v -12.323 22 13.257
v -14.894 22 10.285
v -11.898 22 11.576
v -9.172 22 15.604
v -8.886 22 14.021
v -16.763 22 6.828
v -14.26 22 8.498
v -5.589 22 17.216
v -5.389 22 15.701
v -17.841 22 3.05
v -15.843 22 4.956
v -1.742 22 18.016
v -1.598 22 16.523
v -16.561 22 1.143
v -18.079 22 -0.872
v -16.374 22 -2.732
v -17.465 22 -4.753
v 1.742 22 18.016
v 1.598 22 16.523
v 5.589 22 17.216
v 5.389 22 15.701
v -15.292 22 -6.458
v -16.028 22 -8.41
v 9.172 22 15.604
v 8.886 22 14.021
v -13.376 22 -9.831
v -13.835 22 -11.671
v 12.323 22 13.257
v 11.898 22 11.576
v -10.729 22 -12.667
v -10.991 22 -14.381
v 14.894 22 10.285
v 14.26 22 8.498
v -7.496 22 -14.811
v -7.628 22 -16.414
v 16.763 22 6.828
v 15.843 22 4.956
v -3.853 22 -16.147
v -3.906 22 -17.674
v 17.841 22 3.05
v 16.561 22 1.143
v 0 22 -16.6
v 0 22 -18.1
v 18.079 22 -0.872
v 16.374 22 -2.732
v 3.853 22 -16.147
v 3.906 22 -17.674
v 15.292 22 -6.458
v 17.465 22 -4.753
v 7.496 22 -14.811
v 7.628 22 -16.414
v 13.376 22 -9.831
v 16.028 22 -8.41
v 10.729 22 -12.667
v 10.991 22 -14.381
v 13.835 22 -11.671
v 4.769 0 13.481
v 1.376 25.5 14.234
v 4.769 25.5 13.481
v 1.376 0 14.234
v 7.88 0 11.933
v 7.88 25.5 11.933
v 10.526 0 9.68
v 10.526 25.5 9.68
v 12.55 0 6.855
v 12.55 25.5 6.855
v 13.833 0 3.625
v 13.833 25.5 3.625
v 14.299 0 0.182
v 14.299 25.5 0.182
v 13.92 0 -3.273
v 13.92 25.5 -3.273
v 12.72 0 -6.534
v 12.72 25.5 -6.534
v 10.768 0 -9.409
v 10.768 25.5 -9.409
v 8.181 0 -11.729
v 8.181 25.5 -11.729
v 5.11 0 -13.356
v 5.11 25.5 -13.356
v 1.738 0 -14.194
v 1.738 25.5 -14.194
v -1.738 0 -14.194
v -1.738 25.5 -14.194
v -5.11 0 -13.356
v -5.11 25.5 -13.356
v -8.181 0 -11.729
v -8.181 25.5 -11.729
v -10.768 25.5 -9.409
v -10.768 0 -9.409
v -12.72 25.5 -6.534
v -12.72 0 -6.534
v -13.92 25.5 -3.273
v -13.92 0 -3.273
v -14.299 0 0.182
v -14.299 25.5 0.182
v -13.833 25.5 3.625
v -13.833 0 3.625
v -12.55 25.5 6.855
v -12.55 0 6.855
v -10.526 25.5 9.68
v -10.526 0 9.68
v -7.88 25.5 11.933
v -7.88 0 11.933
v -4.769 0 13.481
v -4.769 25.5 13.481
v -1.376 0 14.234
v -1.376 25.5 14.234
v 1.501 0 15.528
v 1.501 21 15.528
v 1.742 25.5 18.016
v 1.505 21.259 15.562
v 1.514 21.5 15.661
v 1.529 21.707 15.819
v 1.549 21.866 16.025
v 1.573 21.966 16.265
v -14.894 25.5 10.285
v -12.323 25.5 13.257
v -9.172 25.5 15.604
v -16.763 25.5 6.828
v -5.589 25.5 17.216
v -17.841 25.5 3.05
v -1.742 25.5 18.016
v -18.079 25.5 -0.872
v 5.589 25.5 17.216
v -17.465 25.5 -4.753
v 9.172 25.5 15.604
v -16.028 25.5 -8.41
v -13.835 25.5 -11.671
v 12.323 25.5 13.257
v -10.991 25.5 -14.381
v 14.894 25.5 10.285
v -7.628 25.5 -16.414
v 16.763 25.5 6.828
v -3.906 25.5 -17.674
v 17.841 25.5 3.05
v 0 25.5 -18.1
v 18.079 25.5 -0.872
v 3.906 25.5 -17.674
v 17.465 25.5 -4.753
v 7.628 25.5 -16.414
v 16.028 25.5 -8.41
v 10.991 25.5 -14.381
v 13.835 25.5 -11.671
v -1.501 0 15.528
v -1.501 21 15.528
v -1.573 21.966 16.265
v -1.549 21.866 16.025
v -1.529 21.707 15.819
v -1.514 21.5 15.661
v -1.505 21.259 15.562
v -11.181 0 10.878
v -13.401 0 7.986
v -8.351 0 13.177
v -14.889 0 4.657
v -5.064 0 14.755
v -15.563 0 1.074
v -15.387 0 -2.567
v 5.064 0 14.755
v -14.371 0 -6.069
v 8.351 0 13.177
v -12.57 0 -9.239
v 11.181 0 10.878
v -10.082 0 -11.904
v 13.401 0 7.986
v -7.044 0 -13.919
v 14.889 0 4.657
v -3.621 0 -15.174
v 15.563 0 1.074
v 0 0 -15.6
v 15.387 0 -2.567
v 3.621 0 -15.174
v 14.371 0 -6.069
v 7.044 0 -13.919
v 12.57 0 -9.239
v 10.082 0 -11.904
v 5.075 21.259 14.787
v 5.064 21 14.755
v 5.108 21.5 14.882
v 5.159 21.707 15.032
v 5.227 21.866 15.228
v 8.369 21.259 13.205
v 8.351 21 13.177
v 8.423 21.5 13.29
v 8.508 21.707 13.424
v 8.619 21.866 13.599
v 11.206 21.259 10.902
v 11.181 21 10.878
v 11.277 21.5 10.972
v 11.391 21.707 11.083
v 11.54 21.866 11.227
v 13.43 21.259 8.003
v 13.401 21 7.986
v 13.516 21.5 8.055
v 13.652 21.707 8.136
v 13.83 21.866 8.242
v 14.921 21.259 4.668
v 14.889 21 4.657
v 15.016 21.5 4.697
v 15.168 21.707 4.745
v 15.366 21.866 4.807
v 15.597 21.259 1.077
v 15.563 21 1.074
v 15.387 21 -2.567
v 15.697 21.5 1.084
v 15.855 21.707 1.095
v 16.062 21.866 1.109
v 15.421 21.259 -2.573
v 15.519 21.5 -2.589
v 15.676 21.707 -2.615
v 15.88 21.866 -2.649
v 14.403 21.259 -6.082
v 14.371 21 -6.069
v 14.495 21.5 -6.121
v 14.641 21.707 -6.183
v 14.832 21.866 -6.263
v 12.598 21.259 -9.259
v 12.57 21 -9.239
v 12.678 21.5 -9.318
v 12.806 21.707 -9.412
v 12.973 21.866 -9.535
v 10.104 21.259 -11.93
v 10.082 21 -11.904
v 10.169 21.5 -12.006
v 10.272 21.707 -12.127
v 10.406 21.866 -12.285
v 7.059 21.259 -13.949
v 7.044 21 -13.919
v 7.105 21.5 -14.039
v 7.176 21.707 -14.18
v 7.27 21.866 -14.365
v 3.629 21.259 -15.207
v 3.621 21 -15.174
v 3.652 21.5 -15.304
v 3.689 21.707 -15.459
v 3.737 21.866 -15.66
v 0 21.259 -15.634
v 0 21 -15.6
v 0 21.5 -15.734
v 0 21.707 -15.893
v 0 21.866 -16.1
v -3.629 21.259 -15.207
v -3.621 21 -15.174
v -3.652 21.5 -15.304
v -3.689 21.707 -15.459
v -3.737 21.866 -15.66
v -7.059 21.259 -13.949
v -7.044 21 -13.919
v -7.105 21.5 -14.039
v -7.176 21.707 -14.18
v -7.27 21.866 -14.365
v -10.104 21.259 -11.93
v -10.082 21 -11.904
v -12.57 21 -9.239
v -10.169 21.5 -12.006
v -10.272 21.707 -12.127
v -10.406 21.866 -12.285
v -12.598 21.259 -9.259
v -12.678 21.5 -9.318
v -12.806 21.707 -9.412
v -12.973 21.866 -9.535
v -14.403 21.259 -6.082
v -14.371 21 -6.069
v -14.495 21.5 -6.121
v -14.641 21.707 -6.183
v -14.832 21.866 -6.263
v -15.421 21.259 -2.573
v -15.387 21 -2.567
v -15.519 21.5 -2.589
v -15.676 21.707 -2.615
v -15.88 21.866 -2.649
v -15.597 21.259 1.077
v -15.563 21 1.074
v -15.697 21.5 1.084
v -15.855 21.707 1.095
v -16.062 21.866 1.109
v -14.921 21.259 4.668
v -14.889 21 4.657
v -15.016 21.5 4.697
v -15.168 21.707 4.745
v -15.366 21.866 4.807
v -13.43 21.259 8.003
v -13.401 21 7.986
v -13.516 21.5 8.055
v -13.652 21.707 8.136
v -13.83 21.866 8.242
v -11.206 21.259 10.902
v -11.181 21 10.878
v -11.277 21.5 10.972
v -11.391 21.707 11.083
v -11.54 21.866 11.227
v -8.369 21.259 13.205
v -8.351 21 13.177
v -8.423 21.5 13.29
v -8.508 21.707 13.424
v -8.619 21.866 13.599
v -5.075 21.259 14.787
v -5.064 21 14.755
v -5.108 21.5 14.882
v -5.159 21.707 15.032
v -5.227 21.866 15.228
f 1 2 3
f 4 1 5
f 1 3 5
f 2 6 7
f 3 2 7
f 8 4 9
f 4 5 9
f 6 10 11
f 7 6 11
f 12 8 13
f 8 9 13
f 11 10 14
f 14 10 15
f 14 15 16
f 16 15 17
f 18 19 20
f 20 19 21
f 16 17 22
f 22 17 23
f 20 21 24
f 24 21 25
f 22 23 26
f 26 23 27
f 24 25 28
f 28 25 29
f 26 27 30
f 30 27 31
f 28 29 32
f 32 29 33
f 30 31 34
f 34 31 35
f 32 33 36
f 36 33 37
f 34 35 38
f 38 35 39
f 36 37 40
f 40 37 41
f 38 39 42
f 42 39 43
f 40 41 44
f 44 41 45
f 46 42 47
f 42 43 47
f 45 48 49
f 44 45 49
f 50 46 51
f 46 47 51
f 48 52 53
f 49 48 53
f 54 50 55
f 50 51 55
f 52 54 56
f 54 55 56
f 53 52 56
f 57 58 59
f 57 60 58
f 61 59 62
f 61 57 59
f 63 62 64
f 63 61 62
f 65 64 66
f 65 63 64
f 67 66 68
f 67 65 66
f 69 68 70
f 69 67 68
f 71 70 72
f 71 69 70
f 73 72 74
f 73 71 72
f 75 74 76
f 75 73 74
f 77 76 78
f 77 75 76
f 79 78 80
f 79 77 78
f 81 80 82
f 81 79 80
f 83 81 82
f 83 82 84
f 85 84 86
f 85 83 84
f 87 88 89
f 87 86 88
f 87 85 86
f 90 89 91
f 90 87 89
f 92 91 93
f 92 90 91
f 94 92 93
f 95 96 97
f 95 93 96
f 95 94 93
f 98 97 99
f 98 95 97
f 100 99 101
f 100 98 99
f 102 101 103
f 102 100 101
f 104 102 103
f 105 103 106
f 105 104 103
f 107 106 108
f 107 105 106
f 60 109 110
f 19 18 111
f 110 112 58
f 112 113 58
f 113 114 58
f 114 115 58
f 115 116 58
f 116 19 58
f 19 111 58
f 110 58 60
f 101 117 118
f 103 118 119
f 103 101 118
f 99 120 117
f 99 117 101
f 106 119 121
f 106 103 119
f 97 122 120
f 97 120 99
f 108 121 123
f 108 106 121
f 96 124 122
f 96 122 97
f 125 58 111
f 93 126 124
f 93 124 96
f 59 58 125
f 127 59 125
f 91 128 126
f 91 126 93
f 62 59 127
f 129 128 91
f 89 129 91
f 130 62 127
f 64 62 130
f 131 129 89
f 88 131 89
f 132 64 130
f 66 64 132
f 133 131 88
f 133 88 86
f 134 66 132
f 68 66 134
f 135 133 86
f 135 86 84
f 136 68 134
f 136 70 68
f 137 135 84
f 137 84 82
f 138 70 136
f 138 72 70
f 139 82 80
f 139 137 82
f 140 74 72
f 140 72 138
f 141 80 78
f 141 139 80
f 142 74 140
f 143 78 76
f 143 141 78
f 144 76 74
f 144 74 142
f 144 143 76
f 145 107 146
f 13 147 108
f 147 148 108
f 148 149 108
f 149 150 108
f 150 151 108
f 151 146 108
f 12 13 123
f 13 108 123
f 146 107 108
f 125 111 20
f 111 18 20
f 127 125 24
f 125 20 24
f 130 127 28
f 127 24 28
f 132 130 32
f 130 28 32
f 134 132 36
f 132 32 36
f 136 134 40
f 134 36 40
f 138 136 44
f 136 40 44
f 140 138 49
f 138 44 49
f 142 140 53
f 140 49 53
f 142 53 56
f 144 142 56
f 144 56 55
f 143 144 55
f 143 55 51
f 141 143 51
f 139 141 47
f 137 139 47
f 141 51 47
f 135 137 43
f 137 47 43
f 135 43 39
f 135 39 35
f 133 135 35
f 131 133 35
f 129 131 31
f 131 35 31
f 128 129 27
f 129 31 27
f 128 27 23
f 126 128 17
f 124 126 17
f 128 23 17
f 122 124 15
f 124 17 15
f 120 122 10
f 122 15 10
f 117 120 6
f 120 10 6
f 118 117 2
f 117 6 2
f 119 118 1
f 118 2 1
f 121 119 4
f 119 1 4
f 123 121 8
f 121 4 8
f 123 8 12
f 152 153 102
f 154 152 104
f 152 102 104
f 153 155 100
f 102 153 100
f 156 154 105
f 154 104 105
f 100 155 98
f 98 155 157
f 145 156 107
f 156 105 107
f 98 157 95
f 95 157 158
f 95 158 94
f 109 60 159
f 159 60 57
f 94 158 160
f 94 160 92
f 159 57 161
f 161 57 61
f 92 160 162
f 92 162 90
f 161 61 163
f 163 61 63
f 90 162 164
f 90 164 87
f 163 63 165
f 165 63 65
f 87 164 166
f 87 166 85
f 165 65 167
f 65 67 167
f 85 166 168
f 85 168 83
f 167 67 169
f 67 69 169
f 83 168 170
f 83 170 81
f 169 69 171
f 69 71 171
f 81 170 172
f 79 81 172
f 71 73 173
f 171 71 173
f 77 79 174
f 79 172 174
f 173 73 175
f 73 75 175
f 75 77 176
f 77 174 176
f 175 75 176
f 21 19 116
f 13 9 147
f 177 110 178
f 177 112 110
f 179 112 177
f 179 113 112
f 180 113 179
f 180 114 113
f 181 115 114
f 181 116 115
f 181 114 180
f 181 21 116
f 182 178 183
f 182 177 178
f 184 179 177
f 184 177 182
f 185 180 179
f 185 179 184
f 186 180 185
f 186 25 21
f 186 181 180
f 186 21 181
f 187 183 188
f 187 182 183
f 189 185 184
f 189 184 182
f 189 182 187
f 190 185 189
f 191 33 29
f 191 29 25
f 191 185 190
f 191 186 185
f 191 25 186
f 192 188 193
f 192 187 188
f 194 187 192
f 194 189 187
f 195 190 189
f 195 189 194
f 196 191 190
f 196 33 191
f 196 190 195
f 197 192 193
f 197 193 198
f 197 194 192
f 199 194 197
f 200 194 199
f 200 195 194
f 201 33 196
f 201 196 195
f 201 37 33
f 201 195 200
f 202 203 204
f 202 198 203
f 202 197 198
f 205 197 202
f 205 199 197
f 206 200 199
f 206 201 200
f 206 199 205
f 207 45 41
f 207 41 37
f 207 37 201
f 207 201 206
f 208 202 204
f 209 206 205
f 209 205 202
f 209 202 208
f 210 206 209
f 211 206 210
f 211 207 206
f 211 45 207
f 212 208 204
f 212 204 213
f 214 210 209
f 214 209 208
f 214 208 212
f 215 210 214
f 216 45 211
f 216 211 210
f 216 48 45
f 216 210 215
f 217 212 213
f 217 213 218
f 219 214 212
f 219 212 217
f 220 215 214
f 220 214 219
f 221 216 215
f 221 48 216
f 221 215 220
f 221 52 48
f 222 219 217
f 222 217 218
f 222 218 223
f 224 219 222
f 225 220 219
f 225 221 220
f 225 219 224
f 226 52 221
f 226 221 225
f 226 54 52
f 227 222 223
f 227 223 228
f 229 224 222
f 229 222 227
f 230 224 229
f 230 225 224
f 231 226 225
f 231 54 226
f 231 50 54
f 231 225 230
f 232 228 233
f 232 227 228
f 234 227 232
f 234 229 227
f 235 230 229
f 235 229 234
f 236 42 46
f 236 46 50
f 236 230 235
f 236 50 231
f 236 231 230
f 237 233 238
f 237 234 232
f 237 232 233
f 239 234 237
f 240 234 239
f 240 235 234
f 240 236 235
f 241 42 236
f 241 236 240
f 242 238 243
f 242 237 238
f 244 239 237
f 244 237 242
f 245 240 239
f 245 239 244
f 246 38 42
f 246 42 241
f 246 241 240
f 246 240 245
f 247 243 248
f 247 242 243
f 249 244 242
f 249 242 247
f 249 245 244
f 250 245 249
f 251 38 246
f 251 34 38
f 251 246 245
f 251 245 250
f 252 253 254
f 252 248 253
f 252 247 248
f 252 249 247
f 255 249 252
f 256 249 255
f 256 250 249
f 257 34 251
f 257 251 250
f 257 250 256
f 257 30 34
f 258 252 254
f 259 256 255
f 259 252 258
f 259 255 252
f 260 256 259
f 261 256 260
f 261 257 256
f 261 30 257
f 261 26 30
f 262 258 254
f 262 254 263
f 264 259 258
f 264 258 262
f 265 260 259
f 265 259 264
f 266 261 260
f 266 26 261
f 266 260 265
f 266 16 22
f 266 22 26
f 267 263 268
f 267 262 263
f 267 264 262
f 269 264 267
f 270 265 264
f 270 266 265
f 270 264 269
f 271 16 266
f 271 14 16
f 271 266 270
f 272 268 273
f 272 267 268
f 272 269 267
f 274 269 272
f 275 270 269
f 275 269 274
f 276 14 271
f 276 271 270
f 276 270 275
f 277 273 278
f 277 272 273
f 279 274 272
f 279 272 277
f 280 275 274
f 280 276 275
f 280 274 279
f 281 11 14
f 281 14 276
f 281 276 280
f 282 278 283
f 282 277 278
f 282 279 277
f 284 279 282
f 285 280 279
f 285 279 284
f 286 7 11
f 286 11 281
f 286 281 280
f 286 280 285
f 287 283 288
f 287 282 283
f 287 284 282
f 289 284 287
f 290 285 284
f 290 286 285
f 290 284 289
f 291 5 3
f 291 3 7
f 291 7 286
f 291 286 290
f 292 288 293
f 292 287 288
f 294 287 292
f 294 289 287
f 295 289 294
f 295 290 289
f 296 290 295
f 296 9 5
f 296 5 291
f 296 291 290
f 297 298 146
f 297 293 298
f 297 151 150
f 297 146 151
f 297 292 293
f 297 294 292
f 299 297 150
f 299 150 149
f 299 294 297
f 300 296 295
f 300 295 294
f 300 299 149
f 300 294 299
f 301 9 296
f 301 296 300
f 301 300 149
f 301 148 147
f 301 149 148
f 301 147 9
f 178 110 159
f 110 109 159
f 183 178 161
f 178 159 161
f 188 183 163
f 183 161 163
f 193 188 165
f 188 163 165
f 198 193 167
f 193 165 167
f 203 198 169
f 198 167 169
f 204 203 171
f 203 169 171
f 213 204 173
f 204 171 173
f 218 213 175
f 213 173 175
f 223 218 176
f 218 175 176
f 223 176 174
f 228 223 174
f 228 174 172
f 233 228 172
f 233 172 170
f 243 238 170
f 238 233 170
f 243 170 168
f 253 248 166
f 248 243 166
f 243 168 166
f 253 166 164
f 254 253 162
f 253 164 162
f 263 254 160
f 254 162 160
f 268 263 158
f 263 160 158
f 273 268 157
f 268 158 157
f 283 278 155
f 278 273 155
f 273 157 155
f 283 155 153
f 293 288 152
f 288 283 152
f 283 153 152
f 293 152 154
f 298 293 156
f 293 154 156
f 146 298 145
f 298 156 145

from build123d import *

# Parameters (mm, degrees)
SKETCH1_R           = 15.6
SKETCH1_R_2         = 14.3
BOSS_EXTRUDE1_DEPTH = 22
SKETCH2_R           = 18.1
SKETCH2_R_2         = 14.3
BOSS_EXTRUDE2_DEPTH = 3.5
FILLET1_R           = 1
CUT_EXTRUDE1_DEPTH  = 26.5


with BuildPart() as part:
    # Sketch1 → Boss-Extrude1 (new body)
    with BuildSketch(Plane(origin=(0, 0, 0), x_dir=(1, 0, 0), z_dir=(0, 1, 0))):
        Circle(SKETCH1_R)
        Circle(SKETCH1_R_2, mode=Mode.SUBTRACT)
    extrude(amount=BOSS_EXTRUDE1_DEPTH)

    # Sketch2 → Boss-Extrude2 (add)
    with BuildSketch(Plane(origin=(0, 22, 0), x_dir=(1, 0, 0), z_dir=(0, 1, 0))):
        Circle(SKETCH2_R)
        Circle(SKETCH2_R_2, mode=Mode.SUBTRACT)
    extrude(amount=BOSS_EXTRUDE2_DEPTH)

    # Fillet1
    fillet1_edges = [part.edges().sort_by_distance(p)[0] for p in [
        (-15.6, 22, 0),
    ]]
    fillet(fillet1_edges, radius=FILLET1_R)

    # Sketch3 → Cut-Extrude1 (cut, through all)
    with BuildSketch(Plane(origin=(0, 25.5, 0), x_dir=(1, 0, 0), z_dir=(0, 1, 0))):
        Polygon((0, 0), (-1.75, -18.1), (1.75, -18.1), align=None)
    extrude(amount=-CUT_EXTRUDE1_DEPTH, mode=Mode.SUBTRACT)


solid = part.part
